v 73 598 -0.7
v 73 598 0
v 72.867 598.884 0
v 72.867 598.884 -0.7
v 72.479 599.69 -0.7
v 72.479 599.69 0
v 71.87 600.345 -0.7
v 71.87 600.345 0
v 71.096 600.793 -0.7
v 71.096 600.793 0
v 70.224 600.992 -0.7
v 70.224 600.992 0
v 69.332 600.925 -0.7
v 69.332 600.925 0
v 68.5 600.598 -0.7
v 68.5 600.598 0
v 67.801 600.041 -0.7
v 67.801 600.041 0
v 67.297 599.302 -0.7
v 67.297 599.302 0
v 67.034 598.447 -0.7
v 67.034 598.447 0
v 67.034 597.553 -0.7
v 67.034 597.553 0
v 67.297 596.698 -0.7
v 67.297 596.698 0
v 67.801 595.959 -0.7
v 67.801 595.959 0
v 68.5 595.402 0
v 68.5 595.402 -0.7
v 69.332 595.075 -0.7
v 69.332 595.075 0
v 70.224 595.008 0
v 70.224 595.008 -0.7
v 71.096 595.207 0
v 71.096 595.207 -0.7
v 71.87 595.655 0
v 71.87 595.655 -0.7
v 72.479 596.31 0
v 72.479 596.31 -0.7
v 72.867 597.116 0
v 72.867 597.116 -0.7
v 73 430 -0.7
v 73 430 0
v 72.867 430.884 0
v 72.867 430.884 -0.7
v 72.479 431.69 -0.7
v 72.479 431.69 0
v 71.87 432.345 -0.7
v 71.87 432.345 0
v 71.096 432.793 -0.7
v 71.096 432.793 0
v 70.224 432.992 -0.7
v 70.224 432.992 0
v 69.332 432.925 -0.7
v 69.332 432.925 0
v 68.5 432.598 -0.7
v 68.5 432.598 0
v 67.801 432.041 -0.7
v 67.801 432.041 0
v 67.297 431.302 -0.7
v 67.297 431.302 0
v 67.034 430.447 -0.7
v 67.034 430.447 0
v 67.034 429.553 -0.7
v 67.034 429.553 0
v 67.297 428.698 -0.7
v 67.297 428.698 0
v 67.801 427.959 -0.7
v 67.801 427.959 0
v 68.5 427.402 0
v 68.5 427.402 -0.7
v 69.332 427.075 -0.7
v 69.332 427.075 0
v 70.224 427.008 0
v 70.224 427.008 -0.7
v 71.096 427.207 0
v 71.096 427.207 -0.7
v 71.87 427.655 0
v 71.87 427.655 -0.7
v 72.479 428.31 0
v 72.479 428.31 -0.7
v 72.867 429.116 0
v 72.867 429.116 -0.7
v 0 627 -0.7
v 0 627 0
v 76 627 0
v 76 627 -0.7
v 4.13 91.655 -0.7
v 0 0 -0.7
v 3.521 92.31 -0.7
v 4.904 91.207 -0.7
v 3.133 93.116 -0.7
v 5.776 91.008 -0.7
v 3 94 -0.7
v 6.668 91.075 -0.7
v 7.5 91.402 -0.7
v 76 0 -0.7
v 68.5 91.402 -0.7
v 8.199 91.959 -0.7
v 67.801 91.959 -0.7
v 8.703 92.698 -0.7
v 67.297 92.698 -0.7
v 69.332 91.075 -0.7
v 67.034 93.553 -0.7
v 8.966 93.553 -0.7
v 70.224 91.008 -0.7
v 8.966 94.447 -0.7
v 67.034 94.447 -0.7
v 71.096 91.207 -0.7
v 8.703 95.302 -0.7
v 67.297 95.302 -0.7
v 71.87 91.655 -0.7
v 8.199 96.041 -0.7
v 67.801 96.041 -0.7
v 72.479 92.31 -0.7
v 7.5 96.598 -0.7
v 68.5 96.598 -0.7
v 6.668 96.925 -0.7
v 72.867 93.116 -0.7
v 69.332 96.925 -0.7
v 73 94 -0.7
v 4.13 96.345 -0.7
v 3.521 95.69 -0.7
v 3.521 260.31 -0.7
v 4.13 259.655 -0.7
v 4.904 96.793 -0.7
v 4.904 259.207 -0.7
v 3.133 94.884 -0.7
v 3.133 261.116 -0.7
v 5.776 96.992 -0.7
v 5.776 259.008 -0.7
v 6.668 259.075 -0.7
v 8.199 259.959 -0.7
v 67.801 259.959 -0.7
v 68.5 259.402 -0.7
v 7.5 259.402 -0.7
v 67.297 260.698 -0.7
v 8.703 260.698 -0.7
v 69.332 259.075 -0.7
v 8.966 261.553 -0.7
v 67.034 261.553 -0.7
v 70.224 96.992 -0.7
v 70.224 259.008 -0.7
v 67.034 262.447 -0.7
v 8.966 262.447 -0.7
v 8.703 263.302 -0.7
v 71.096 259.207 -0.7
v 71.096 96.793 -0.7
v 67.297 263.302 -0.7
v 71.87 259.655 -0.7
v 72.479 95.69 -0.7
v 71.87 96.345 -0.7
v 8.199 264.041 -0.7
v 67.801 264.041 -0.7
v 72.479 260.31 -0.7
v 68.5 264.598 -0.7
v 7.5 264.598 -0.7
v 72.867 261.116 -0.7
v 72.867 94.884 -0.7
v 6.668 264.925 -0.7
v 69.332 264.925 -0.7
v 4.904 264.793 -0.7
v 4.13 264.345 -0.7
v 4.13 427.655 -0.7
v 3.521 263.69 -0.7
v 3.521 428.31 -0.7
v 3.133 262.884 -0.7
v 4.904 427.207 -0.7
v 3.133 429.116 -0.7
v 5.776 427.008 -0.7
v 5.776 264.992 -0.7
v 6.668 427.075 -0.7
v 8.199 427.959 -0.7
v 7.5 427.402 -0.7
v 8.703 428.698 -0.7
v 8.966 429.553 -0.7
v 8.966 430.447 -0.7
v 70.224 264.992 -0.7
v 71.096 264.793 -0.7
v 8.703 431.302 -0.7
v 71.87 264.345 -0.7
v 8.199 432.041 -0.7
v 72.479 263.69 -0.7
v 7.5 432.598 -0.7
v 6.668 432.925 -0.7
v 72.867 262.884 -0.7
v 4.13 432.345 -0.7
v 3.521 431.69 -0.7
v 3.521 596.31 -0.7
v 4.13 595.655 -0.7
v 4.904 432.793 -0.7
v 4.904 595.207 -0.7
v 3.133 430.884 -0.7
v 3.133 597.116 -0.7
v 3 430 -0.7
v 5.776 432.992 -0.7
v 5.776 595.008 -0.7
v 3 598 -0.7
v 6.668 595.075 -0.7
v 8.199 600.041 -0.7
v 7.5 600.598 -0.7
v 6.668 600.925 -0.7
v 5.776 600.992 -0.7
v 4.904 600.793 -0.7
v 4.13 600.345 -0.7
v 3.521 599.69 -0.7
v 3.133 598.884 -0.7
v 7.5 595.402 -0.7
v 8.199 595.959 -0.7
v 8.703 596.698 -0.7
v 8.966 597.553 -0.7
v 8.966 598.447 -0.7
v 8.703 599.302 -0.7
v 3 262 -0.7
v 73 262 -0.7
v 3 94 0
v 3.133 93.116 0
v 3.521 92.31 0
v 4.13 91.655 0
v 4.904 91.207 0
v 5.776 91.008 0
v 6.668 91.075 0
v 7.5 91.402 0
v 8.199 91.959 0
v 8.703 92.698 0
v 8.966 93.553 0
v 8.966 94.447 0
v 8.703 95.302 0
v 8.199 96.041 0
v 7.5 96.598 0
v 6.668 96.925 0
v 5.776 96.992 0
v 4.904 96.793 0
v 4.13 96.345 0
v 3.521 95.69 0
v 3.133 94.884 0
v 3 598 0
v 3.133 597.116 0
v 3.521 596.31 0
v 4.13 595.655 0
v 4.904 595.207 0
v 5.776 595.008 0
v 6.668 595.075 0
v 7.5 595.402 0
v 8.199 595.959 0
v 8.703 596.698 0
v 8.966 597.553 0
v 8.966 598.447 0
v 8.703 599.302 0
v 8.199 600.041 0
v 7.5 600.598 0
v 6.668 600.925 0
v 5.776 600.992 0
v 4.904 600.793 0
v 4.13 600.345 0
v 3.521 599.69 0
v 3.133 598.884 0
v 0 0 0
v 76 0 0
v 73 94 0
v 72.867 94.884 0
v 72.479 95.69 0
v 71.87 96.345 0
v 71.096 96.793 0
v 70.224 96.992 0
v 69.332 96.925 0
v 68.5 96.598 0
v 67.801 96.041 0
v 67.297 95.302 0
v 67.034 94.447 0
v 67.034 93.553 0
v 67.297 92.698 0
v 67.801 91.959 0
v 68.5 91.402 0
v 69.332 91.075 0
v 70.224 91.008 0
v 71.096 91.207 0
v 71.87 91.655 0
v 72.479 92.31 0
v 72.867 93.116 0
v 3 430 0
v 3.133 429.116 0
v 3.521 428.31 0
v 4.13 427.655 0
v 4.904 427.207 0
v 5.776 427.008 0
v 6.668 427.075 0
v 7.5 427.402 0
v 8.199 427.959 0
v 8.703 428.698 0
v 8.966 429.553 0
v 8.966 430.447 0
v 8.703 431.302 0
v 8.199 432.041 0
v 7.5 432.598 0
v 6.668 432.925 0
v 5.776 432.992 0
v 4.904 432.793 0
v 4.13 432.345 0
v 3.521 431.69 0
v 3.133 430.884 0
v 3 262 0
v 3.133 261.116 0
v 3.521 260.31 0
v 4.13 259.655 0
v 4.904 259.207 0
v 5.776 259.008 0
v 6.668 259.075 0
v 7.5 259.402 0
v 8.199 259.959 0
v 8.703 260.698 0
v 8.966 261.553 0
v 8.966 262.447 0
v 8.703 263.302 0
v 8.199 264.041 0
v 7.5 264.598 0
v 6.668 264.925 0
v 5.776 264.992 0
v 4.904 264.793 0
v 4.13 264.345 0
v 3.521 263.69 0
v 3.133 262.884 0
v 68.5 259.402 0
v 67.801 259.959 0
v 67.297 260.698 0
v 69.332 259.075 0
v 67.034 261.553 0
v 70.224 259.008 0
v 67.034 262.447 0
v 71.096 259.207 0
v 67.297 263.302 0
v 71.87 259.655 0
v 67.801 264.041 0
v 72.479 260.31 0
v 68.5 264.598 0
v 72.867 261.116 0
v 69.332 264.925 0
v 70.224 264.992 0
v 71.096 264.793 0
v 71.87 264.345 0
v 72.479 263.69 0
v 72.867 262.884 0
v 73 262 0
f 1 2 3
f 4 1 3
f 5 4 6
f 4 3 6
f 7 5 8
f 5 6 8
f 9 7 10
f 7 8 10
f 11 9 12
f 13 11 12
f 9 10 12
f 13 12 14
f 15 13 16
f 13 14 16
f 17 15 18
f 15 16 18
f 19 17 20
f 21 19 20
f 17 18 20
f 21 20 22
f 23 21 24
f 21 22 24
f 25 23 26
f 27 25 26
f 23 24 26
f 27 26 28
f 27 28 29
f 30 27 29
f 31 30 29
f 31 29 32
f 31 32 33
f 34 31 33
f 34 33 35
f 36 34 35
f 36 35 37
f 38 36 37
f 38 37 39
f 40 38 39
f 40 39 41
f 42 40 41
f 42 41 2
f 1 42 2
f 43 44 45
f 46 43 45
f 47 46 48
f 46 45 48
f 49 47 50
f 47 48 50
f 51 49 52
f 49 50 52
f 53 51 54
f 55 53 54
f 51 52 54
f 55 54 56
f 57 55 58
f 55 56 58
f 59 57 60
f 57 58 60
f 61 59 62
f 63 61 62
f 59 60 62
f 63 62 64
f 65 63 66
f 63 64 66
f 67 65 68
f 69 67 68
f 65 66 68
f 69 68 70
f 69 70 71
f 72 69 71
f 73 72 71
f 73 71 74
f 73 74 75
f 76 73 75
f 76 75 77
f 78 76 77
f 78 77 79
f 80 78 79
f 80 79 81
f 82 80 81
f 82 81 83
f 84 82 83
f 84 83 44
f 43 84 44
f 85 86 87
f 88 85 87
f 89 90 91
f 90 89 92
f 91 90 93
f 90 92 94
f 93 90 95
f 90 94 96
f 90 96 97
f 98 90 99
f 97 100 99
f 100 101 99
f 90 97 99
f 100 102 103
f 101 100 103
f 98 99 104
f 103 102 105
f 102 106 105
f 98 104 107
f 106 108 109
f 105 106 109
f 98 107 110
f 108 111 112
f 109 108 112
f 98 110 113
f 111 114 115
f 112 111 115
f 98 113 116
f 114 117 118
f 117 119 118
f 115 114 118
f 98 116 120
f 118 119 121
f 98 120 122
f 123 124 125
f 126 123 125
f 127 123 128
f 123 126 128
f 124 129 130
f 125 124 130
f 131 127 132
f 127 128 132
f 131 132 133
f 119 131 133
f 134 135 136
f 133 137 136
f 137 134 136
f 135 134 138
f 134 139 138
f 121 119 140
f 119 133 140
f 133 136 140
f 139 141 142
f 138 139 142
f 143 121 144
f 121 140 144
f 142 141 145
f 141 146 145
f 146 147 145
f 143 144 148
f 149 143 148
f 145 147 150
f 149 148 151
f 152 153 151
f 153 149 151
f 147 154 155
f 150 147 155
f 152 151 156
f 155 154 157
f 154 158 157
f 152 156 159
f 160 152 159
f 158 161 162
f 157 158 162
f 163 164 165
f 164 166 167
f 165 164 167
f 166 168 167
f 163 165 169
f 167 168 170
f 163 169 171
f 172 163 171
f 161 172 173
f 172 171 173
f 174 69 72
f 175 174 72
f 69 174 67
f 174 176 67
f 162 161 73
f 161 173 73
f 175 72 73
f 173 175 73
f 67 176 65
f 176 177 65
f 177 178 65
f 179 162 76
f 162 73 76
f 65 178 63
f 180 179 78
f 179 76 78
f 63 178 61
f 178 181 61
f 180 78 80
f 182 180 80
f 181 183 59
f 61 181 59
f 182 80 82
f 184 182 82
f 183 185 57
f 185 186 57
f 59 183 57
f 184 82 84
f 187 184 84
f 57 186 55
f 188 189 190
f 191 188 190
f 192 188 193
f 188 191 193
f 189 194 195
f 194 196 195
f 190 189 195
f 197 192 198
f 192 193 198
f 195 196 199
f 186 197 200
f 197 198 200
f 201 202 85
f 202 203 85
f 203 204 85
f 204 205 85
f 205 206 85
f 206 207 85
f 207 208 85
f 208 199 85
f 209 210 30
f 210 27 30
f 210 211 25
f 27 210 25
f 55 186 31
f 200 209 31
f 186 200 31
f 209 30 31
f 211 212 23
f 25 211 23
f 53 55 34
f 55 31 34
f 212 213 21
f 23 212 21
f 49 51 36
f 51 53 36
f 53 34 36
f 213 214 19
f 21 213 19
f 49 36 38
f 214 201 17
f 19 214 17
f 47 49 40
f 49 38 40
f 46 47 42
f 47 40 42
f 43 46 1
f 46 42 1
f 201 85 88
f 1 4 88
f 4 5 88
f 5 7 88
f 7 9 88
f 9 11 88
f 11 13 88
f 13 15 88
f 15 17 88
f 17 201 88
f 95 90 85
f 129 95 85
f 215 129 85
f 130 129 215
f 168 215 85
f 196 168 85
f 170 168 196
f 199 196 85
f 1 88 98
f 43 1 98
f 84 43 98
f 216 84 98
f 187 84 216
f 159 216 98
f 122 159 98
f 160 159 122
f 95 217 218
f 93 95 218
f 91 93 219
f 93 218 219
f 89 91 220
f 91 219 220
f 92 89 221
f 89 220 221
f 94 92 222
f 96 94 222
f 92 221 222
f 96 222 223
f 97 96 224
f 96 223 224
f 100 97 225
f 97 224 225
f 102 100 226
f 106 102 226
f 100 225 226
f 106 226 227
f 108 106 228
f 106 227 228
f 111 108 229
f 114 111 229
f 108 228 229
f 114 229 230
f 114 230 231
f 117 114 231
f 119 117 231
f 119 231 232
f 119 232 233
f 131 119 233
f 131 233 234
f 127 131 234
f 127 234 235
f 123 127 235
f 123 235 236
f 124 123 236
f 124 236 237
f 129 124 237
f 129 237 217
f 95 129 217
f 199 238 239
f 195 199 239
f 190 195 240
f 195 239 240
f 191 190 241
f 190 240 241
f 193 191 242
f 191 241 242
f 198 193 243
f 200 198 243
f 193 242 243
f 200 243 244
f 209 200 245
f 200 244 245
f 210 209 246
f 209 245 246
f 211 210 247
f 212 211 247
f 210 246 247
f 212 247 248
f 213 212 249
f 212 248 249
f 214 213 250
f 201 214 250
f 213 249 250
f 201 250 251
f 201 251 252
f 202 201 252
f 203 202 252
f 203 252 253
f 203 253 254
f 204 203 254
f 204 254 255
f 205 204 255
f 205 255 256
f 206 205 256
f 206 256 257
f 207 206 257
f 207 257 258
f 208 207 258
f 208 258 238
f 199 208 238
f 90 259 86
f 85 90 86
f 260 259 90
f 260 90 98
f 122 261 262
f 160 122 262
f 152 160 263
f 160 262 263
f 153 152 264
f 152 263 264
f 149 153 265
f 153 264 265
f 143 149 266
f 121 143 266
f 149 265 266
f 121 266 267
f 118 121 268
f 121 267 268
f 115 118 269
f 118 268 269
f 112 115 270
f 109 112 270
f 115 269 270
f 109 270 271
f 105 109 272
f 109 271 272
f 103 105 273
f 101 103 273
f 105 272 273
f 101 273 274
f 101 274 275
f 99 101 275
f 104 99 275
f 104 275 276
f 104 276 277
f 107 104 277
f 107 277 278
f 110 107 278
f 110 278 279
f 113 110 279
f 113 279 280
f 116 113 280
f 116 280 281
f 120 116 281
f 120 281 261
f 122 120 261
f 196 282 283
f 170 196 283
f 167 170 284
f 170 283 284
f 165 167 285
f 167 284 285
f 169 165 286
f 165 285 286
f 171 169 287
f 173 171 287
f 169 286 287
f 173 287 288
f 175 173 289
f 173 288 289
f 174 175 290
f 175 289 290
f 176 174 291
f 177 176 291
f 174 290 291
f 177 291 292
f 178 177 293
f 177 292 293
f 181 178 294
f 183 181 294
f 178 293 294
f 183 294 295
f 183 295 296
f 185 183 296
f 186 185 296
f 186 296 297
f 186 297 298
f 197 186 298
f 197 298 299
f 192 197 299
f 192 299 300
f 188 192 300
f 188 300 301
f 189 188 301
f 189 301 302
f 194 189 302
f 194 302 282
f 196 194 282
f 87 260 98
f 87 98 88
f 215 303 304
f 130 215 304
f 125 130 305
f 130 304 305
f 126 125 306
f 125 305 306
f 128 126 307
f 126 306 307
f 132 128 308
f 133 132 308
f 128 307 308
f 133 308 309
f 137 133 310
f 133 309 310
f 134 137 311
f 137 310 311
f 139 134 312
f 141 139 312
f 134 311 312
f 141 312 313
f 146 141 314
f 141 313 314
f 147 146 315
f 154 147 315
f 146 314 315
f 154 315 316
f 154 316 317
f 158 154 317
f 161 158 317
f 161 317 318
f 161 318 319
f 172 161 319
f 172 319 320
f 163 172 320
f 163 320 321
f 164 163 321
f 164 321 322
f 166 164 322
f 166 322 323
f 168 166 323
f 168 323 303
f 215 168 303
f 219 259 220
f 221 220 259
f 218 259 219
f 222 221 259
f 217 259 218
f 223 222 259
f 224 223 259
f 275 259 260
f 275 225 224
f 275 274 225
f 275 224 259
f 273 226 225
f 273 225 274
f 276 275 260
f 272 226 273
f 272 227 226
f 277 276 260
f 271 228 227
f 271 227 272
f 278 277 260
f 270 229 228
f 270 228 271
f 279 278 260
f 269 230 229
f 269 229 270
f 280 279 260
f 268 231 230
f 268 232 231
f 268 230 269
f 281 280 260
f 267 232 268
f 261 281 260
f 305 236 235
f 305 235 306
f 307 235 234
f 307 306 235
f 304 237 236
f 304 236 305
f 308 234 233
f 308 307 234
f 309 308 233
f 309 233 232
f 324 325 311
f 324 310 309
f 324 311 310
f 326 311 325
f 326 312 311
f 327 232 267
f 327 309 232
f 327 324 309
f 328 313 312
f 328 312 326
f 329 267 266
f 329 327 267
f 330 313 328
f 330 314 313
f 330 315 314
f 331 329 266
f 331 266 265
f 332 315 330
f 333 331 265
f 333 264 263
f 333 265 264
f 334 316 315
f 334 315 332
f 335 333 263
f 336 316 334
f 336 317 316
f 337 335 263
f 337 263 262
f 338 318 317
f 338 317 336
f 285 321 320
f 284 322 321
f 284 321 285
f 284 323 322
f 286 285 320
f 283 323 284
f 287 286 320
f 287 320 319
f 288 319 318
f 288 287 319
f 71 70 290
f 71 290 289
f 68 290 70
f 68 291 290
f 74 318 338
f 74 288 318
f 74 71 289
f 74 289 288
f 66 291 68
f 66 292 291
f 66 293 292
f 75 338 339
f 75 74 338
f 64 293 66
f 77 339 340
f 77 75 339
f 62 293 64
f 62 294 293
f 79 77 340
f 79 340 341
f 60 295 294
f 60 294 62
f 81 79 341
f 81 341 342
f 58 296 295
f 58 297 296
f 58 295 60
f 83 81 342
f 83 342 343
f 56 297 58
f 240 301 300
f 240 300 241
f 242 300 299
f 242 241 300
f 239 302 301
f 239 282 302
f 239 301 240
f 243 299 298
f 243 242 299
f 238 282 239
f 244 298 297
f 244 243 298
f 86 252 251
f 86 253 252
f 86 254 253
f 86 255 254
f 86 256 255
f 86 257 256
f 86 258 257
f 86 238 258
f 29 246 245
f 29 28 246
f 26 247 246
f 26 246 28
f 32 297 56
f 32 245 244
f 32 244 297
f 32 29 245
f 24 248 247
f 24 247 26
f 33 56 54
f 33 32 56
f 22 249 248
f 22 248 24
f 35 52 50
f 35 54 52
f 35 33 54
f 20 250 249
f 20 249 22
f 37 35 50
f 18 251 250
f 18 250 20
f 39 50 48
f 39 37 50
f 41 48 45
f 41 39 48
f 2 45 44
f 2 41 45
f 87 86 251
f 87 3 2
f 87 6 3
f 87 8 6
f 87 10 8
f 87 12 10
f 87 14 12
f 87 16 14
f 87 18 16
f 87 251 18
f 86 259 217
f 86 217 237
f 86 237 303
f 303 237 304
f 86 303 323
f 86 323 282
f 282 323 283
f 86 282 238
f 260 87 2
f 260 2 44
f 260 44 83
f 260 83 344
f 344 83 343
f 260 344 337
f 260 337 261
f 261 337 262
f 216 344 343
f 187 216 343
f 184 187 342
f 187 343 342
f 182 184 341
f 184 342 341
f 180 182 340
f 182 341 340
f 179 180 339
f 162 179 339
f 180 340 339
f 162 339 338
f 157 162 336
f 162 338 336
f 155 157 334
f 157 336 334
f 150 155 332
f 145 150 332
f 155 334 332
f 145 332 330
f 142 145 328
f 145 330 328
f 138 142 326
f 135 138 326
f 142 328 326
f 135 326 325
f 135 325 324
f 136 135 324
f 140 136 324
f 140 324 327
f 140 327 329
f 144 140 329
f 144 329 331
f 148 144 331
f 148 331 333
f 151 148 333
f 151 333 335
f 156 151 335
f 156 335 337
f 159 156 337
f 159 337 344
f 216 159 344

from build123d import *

# Parameters (mm, degrees)
SKETCH1_W          = 76
SKETCH1_H          = 627
BASE_FLANGE1_DEPTH = 0.7
SKETCH2_R          = 3
CUT_EXTRUDE1_DEPTH = 10


# Sheet-metal steps are written as plain solids
with BuildPart() as part:
    # Sketch1 → Base-Flange1 (new body)
    with BuildSketch(Plane.XY):
        with Locations((38, 313.5)):
            Rectangle(SKETCH1_W, SKETCH1_H)
    extrude(amount=-BASE_FLANGE1_DEPTH)

    # Sketch2 → Cut-Extrude1 (cut)
    with BuildSketch(Plane.XY):
        with Locations((70, 598)):
            Circle(SKETCH2_R)
        with Locations((70, 430)):
            Circle(SKETCH2_R)
        with Locations((70, 262)):
            Circle(SKETCH2_R)
        with Locations((70, 94)):
            Circle(SKETCH2_R)
        with Locations((70, -74)):
            Circle(SKETCH2_R)
        with Locations((6, -74)):
            Circle(SKETCH2_R)
        with Locations(Location((6, 94, 0), (0, 0, 180))):
            Circle(SKETCH2_R)
        with Locations(Location((6, 262, 0), (0, 0, 180))):
            Circle(SKETCH2_R)
        with Locations(Location((6, 430, 0), (0, 0, 180))):
            Circle(SKETCH2_R)
        with Locations(Location((6, 598, 0), (0, 0, 180))):
            Circle(SKETCH2_R)
    extrude(amount=-CUT_EXTRUDE1_DEPTH, mode=Mode.SUBTRACT)


solid = part.part
